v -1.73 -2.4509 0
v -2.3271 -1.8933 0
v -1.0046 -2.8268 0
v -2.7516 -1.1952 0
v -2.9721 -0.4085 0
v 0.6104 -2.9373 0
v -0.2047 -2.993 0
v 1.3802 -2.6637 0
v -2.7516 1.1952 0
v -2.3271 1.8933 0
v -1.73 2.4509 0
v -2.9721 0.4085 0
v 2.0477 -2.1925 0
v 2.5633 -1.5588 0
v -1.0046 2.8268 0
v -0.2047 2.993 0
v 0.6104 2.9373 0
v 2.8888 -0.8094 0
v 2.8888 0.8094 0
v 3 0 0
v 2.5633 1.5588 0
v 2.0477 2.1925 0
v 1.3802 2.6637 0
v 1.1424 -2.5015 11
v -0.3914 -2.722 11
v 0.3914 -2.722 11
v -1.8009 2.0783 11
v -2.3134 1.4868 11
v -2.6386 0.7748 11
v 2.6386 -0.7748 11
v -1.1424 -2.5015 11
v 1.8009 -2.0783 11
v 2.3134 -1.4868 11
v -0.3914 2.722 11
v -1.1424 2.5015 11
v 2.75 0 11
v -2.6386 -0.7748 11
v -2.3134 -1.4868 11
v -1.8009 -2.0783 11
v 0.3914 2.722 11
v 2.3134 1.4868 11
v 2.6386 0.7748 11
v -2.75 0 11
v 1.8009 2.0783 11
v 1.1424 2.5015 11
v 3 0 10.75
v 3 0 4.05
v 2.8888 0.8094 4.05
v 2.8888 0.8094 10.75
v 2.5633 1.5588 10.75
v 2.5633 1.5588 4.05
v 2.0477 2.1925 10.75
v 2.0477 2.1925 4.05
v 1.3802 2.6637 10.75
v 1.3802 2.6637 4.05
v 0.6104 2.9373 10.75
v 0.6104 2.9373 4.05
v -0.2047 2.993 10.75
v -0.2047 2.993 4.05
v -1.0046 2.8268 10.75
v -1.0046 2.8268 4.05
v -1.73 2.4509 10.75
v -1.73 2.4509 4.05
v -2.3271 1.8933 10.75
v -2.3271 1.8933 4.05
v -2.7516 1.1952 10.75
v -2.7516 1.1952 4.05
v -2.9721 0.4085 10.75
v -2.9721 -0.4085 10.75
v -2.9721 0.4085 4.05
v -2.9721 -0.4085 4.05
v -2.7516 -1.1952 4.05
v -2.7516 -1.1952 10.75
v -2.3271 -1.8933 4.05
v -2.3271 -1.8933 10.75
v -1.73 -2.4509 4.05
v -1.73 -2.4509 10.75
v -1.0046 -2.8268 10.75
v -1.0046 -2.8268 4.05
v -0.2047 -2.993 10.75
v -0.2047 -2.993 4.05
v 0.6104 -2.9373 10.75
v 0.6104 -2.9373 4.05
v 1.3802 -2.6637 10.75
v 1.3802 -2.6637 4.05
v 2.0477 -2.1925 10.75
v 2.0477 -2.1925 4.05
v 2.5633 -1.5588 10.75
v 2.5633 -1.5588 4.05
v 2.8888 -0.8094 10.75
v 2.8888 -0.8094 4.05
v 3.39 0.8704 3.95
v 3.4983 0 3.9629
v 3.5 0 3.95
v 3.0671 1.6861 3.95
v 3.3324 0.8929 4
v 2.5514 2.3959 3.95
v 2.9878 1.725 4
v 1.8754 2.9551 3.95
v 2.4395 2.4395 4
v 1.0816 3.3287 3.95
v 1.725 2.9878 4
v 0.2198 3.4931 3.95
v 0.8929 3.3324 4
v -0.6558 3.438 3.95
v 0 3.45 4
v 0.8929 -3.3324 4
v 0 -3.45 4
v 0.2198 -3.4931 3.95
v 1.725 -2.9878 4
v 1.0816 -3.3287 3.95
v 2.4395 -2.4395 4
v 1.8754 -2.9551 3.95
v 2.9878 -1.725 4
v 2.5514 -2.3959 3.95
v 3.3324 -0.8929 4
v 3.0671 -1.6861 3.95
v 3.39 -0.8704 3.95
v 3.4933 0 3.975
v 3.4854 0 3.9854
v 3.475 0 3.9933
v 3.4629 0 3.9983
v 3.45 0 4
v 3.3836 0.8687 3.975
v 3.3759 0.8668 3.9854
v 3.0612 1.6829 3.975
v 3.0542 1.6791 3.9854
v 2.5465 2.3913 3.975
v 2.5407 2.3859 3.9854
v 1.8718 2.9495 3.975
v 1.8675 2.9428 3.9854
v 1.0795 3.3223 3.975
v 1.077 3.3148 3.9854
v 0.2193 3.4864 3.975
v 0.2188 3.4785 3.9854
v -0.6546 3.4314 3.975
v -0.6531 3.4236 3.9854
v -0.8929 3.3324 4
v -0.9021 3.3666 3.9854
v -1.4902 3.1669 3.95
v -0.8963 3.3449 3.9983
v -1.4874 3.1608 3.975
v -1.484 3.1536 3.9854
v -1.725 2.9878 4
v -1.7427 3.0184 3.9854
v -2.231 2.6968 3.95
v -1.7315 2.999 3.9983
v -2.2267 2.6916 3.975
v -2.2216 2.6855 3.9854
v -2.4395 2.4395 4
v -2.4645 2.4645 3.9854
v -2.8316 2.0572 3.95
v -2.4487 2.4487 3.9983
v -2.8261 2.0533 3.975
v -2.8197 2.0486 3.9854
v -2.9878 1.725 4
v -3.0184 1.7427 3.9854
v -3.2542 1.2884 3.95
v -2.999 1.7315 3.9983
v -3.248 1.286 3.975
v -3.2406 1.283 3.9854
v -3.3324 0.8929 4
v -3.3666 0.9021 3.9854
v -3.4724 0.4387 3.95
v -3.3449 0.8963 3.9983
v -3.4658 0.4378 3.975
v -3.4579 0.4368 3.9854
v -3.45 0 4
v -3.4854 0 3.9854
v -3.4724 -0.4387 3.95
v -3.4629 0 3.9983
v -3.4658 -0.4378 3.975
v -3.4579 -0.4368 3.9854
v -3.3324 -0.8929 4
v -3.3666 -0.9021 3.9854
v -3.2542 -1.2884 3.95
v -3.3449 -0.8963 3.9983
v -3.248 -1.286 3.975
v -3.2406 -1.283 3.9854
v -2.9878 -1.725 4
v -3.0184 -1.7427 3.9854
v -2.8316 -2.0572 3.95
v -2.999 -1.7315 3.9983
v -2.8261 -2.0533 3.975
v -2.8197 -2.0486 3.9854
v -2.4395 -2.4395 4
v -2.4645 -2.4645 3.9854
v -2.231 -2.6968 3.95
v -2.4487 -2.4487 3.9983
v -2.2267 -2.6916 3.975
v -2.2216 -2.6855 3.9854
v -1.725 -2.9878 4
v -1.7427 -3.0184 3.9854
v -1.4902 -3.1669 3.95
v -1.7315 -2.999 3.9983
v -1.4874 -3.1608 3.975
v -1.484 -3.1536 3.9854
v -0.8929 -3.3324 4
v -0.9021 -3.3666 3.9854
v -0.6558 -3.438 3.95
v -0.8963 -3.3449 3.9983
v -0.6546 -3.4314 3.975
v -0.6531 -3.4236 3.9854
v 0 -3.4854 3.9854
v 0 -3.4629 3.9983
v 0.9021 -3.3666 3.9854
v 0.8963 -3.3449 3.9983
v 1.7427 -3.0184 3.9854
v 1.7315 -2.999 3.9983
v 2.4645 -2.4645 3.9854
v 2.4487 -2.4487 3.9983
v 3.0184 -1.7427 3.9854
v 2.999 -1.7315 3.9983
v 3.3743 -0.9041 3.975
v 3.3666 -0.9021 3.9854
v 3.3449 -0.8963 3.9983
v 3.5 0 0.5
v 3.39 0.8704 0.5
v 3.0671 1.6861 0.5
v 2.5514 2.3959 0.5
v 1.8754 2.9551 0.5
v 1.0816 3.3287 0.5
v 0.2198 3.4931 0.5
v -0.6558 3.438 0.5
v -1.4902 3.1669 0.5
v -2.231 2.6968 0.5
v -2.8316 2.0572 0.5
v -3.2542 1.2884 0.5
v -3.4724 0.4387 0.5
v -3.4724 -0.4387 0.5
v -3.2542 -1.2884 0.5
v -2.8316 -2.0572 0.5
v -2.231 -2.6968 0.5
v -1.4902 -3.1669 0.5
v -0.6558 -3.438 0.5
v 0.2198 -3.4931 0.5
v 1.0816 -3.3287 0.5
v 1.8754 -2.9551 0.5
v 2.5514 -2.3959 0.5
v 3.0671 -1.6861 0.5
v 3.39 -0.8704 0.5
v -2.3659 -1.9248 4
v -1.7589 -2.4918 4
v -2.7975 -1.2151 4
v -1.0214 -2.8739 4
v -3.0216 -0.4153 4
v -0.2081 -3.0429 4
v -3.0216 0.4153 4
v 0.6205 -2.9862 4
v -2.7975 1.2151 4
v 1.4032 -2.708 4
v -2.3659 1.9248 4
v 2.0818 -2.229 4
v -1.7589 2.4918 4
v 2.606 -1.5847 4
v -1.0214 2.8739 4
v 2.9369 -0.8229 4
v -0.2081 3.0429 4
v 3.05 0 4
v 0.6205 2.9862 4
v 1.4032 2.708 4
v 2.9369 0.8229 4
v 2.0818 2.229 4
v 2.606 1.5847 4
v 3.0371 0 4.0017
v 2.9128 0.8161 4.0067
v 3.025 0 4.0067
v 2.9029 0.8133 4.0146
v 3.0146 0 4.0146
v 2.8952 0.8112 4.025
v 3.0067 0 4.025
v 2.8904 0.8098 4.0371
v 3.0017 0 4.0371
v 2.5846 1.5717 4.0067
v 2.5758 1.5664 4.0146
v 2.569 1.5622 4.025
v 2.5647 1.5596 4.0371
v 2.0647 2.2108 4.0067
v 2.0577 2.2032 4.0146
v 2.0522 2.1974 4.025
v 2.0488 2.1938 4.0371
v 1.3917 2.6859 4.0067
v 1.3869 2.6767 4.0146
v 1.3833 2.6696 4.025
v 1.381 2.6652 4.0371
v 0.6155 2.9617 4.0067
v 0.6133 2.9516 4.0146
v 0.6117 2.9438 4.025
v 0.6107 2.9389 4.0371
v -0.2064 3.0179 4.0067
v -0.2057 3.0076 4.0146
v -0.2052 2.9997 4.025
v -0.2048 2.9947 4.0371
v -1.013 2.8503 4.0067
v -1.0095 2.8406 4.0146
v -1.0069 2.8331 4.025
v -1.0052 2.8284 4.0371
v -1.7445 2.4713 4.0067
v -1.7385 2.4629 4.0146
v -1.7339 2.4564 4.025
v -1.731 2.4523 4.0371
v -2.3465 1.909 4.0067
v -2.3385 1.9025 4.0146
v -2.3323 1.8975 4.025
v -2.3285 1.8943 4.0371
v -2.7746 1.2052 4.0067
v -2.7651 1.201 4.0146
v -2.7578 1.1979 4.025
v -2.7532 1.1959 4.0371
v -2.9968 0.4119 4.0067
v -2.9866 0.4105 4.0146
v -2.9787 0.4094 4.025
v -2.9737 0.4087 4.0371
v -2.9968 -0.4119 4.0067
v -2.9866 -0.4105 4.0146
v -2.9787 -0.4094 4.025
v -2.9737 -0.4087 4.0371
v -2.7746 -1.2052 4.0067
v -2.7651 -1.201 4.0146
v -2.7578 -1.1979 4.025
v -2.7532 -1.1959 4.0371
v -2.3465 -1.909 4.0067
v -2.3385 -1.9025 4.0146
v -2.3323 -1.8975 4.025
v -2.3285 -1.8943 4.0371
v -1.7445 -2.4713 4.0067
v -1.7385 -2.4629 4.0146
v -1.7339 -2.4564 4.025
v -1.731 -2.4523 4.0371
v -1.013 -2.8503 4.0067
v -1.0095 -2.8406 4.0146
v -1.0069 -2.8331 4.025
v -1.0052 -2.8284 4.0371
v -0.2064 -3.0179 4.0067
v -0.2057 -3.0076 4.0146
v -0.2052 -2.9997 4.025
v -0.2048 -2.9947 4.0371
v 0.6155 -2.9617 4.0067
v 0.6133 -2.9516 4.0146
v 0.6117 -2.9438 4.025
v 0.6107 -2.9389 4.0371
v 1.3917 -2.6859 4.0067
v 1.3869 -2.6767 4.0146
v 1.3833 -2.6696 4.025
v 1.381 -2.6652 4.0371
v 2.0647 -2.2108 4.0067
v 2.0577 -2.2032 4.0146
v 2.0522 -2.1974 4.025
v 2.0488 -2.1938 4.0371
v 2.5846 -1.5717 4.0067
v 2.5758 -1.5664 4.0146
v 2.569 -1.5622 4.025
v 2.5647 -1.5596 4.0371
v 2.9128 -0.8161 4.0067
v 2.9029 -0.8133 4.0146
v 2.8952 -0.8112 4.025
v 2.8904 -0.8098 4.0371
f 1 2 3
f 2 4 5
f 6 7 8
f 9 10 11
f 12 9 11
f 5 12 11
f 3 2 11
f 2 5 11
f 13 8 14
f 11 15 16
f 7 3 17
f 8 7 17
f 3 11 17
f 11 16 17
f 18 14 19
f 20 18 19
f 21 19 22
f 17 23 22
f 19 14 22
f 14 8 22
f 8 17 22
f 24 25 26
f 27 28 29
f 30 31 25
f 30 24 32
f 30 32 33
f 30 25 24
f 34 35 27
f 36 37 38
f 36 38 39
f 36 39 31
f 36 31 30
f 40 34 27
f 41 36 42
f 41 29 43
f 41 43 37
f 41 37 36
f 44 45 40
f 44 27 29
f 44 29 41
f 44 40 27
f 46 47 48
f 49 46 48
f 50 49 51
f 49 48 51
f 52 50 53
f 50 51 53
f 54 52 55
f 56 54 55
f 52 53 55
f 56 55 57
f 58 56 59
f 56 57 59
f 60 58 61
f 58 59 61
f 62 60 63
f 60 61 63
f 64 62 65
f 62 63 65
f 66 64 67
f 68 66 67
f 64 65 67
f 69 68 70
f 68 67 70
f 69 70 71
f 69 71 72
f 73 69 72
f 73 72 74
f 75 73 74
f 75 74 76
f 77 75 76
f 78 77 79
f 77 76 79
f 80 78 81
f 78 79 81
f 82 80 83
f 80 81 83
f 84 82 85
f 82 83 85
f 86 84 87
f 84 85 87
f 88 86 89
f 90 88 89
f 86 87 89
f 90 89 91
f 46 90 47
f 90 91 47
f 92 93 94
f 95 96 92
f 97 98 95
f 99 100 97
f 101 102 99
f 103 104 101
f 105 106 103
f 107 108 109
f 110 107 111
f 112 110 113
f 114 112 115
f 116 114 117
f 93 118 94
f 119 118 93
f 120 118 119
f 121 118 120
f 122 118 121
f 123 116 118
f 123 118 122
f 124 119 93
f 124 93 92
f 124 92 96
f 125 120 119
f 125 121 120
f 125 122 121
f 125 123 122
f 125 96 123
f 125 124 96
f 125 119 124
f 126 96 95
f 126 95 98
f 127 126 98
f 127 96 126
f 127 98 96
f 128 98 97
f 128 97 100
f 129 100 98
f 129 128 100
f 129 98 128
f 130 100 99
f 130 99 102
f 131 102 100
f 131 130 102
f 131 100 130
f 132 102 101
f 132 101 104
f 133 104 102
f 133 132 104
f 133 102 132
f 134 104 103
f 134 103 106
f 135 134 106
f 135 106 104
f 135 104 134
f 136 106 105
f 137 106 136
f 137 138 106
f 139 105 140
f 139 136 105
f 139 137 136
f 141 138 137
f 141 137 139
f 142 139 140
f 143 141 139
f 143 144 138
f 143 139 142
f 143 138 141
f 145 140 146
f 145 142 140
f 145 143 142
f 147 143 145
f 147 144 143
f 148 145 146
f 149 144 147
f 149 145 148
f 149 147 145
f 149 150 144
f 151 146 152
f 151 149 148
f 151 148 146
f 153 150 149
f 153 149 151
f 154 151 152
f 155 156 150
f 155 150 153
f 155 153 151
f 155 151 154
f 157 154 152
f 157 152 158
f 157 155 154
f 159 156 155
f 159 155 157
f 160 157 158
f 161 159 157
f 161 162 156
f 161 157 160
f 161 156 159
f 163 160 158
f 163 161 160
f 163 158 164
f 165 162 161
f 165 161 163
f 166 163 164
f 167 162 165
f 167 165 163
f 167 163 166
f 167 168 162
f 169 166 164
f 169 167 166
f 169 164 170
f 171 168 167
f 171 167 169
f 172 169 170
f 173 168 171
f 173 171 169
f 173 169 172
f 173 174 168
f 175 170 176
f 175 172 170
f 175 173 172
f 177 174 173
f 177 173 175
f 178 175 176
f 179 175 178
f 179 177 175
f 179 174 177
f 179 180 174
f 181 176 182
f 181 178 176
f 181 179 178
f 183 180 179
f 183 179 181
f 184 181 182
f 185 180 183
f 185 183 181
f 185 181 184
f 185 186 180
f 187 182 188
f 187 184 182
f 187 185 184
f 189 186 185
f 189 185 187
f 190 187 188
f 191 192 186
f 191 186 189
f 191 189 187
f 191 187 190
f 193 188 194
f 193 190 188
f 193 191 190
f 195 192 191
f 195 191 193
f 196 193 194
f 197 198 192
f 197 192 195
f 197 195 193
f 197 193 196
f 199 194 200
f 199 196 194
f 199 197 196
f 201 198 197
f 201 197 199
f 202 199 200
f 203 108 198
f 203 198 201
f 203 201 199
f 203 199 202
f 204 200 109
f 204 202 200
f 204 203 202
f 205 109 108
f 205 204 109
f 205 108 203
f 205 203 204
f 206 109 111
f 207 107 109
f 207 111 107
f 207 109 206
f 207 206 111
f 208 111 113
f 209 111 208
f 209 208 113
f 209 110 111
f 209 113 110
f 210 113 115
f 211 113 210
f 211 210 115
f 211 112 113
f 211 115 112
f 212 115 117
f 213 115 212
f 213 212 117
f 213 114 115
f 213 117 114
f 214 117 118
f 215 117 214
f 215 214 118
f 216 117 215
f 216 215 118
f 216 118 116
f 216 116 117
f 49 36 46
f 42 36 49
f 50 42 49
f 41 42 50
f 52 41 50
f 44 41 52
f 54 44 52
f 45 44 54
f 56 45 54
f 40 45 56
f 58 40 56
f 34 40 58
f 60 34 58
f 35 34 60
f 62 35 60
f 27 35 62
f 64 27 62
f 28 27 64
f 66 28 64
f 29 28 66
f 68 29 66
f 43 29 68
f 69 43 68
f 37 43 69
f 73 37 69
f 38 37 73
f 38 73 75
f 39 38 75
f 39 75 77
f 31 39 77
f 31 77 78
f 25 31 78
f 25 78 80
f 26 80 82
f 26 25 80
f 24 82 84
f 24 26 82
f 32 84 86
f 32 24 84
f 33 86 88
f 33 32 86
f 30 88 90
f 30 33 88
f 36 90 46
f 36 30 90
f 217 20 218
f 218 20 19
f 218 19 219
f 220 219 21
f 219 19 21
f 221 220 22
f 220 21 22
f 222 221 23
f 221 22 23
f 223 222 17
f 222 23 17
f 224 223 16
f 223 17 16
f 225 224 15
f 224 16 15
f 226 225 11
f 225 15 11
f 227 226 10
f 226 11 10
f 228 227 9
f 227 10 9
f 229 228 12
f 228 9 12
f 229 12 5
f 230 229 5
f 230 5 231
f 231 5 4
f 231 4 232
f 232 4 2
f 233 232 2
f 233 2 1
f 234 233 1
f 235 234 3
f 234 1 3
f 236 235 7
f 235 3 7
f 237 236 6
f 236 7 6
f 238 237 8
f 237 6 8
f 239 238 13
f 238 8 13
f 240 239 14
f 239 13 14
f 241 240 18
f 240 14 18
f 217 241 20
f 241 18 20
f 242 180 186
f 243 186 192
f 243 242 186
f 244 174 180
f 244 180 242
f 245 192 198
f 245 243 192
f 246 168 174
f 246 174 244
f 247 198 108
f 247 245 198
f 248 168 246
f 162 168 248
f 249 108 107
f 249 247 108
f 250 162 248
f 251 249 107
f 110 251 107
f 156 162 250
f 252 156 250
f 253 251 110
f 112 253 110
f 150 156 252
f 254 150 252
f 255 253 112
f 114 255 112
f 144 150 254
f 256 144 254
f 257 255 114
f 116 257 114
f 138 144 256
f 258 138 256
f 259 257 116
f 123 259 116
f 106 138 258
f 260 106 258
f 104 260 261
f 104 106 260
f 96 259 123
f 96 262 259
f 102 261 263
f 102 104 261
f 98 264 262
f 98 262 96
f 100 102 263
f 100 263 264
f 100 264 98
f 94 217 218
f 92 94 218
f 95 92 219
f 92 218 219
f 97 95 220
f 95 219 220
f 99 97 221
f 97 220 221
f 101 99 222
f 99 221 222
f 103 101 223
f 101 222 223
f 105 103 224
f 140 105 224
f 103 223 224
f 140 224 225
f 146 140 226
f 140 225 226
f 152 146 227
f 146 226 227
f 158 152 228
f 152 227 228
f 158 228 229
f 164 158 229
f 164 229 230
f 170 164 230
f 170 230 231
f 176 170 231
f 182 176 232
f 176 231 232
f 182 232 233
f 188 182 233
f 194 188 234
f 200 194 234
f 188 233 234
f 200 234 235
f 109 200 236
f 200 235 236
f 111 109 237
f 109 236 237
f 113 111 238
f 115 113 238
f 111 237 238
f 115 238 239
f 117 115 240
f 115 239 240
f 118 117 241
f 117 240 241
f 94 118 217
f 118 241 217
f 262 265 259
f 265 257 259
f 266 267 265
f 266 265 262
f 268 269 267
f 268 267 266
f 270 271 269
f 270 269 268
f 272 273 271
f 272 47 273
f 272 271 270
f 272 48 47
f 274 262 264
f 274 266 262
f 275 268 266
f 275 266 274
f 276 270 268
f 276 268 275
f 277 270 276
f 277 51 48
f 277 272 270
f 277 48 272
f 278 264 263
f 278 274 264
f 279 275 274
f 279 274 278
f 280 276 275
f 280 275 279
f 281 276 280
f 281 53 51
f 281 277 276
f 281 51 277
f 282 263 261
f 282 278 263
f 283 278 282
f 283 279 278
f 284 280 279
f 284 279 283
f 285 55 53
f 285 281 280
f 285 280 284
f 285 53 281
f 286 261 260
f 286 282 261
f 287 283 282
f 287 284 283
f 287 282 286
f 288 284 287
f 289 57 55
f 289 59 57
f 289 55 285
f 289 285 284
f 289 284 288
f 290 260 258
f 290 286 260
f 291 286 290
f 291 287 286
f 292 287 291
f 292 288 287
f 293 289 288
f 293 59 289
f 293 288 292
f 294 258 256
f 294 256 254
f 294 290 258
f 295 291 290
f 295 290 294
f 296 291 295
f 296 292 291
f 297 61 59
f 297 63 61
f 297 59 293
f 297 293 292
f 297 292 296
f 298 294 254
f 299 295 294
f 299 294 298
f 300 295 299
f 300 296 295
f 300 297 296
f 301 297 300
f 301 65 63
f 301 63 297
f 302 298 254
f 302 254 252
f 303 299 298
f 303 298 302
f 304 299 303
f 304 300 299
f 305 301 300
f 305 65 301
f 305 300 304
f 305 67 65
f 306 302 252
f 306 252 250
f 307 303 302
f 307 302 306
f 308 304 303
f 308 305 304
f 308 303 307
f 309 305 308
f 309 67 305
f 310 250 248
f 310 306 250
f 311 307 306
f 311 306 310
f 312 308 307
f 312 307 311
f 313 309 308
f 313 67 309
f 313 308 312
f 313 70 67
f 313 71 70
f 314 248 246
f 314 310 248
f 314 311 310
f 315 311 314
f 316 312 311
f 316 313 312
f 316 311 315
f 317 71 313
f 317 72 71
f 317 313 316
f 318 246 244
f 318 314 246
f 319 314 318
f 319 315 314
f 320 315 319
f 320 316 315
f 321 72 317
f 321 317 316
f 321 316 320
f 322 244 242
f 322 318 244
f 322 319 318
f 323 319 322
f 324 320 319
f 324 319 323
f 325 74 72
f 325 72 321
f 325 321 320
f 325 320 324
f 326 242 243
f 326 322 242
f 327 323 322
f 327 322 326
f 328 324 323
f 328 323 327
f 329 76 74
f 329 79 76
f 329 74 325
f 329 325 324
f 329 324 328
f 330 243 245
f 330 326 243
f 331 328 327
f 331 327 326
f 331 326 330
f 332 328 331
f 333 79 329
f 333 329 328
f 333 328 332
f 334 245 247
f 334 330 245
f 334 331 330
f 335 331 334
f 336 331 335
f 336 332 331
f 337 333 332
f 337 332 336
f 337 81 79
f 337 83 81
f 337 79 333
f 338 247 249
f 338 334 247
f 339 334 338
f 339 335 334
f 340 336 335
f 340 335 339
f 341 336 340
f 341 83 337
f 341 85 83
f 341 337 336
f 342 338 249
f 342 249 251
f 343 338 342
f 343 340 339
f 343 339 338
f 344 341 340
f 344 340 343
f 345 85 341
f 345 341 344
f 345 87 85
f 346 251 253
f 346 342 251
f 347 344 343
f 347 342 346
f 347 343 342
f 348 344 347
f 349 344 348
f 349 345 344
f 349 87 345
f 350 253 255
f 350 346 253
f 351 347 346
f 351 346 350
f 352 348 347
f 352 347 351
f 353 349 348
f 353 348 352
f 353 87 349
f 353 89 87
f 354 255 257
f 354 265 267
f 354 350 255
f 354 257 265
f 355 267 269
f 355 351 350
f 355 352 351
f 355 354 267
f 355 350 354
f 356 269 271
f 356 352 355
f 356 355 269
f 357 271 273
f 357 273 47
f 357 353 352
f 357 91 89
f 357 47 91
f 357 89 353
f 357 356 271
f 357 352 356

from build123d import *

# Parameters (mm, degrees)
SCHIZZO1_R                   = 3.5
ESTRUSIONE_ESTRUSIONE1_DEPTH = 4
SCHIZZO2_R                   = 3
ESTRUSIONE_ESTRUSIONE2_DEPTH = 7
SMUSSO1_SIZE                 = 0.25
SMUSSO2_SIZE                 = 0.5
RACCORDO1_R                  = 0.05


with BuildPart() as part:
    # Schizzo1 → Estrusione-Estrusione1 (new body)
    with BuildSketch(Plane.XY):
        Circle(SCHIZZO1_R)
    extrude(amount=ESTRUSIONE_ESTRUSIONE1_DEPTH)

    # Schizzo2 → Estrusione-Estrusione2 (add)
    with BuildSketch(Plane.XY.offset(4)):
        Circle(SCHIZZO2_R)
    extrude(amount=ESTRUSIONE_ESTRUSIONE2_DEPTH)

    # Smusso1
    smusso1_edges = [part.edges().sort_by_distance(p)[0] for p in [
        (-3, 0, 11),
    ]]
    chamfer(smusso1_edges, length=SMUSSO1_SIZE)

    # Smusso2
    smusso2_edges = [part.edges().sort_by_distance(p)[0] for p in [
        (-3.5, 0, 0),
    ]]
    chamfer(smusso2_edges, length=SMUSSO2_SIZE)

    # Raccordo1
    raccordo1_edges = [part.edges().sort_by_distance(p)[0] for p in [
        (-3.5, 0, 4),
        (-3, 0, 4),
    ]]
    fillet(raccordo1_edges, radius=RACCORDO1_R)


solid = part.part
